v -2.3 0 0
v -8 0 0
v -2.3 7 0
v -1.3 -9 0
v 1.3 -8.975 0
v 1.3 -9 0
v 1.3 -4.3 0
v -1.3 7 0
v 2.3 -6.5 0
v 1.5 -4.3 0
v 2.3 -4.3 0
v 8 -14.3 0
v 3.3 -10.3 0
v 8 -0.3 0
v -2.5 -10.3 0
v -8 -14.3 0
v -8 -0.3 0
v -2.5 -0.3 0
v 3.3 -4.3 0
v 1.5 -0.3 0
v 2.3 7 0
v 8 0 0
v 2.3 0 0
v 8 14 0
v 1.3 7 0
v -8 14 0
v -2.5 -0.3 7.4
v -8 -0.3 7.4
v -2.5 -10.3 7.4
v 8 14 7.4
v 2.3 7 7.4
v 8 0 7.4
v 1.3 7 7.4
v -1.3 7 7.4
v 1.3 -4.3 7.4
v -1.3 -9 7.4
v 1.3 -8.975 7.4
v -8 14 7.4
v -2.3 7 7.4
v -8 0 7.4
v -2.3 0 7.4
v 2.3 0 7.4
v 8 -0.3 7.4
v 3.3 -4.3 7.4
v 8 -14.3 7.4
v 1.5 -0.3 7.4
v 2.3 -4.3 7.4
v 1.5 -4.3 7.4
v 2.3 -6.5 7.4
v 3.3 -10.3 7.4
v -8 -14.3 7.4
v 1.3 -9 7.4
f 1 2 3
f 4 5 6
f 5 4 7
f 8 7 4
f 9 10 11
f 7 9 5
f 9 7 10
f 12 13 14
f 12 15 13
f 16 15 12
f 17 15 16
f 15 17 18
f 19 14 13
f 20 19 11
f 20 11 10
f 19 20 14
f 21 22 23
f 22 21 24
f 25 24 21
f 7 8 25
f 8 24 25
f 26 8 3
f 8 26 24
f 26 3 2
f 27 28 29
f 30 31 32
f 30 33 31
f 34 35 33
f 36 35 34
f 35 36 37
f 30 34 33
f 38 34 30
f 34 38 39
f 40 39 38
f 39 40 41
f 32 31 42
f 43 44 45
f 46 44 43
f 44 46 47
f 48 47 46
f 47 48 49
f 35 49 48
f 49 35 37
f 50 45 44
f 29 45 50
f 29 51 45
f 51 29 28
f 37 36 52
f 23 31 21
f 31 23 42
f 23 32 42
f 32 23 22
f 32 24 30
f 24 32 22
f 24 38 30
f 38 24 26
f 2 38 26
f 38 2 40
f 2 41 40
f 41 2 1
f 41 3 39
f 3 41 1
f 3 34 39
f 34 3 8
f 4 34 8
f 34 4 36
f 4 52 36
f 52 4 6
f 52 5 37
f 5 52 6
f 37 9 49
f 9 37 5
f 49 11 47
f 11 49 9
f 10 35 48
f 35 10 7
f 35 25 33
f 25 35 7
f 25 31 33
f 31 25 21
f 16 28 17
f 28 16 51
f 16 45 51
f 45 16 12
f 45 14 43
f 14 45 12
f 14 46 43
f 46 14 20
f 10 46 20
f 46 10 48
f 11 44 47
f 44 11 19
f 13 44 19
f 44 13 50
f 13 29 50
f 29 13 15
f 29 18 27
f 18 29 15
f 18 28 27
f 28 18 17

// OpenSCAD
// Review proto (not a part): one of a ladder's stacking hooks in its receiving slot, today (the beam's root
// 7 mm inside the band, square relief ends: 2.0 % at the root, 56 MPa in the FEM) and proposed (root 10 mm,
// R0.6 at the relief's ends: 1.3 %, the corner factor ≈ 1.2).  The profile is the ladder's (printed flat):
// the hook bends in the print plane.  docs/printed-parts-review.md › Ladder.
//
//   openscad -D 'VIEW="today"' -o ladder_hook_today.png mechanical/review/proto/ladder_hook.scad
VIEW = "today";
T = 7.4; HOOK_W = 2.6; HOOK_DROP = 9; HOOK_BARB = 1.0; HOOK_NECK = 4; BAND = 14;
$fn = 32;

module hook_2d() {
    translate([-HOOK_W / 2, -HOOK_DROP]) square([HOOK_W, HOOK_DROP + 0.01]);
    polygon([[HOOK_W / 2 - 0.01, -(HOOK_NECK + 0.3)], [HOOK_W / 2 + HOOK_BARB, -(HOOK_NECK + 0.3)],
             [HOOK_W / 2 + HOOK_BARB, -(HOOK_DROP - 2.5)], [HOOK_W / 2 - 0.01, -HOOK_DROP]]);
}
module relief_2d(root, r) for (s = [-1, 1]) translate([s > 0 ? HOOK_W / 2 : -HOOK_W / 2 - 1, -0.5])
    if (r > 0) hull() { translate([0.5, 0]) square([0.01, 0.01]); translate([0.5, root + 0.5 - r]) circle(r = 0.5); translate([0, 0]) square([1, 0.01]); }
    else square([1, root + 0.5]);
// a slice of the upper ladder's bottom band with one hook (y > 0 the band, the hook hangs below)
module upper(root, r) linear_extrude(T) difference() {
    union() { translate([-8, 0]) square([16, BAND]); hook_2d(); }
    relief_2d(root, r);
}
// the lower ladder's top band with the slot (drawn 0.3 mm lower for the joint's ridge)
module lower() color("#8fa8c8") translate([0, -0.3, 0]) linear_extrude(T) difference() {
    translate([-8, -BAND]) square([16, BAND]);
    translate([-HOOK_W / 2 - 1.2, -HOOK_NECK - 0.01]) square([HOOK_W + 1.4, HOOK_NECK + 1]);
    translate([-HOOK_W / 2 - 1.2, -(HOOK_DROP + 1)]) square([HOOK_W + 1.2 + HOOK_BARB + 1.0, HOOK_DROP + 1 - HOOK_NECK]);
}

if (VIEW == "today") { color("#a9c4e4") upper(7, 0); lower(); }
else { color("#a9c4e4") upper(10, 0.6); lower(); }
